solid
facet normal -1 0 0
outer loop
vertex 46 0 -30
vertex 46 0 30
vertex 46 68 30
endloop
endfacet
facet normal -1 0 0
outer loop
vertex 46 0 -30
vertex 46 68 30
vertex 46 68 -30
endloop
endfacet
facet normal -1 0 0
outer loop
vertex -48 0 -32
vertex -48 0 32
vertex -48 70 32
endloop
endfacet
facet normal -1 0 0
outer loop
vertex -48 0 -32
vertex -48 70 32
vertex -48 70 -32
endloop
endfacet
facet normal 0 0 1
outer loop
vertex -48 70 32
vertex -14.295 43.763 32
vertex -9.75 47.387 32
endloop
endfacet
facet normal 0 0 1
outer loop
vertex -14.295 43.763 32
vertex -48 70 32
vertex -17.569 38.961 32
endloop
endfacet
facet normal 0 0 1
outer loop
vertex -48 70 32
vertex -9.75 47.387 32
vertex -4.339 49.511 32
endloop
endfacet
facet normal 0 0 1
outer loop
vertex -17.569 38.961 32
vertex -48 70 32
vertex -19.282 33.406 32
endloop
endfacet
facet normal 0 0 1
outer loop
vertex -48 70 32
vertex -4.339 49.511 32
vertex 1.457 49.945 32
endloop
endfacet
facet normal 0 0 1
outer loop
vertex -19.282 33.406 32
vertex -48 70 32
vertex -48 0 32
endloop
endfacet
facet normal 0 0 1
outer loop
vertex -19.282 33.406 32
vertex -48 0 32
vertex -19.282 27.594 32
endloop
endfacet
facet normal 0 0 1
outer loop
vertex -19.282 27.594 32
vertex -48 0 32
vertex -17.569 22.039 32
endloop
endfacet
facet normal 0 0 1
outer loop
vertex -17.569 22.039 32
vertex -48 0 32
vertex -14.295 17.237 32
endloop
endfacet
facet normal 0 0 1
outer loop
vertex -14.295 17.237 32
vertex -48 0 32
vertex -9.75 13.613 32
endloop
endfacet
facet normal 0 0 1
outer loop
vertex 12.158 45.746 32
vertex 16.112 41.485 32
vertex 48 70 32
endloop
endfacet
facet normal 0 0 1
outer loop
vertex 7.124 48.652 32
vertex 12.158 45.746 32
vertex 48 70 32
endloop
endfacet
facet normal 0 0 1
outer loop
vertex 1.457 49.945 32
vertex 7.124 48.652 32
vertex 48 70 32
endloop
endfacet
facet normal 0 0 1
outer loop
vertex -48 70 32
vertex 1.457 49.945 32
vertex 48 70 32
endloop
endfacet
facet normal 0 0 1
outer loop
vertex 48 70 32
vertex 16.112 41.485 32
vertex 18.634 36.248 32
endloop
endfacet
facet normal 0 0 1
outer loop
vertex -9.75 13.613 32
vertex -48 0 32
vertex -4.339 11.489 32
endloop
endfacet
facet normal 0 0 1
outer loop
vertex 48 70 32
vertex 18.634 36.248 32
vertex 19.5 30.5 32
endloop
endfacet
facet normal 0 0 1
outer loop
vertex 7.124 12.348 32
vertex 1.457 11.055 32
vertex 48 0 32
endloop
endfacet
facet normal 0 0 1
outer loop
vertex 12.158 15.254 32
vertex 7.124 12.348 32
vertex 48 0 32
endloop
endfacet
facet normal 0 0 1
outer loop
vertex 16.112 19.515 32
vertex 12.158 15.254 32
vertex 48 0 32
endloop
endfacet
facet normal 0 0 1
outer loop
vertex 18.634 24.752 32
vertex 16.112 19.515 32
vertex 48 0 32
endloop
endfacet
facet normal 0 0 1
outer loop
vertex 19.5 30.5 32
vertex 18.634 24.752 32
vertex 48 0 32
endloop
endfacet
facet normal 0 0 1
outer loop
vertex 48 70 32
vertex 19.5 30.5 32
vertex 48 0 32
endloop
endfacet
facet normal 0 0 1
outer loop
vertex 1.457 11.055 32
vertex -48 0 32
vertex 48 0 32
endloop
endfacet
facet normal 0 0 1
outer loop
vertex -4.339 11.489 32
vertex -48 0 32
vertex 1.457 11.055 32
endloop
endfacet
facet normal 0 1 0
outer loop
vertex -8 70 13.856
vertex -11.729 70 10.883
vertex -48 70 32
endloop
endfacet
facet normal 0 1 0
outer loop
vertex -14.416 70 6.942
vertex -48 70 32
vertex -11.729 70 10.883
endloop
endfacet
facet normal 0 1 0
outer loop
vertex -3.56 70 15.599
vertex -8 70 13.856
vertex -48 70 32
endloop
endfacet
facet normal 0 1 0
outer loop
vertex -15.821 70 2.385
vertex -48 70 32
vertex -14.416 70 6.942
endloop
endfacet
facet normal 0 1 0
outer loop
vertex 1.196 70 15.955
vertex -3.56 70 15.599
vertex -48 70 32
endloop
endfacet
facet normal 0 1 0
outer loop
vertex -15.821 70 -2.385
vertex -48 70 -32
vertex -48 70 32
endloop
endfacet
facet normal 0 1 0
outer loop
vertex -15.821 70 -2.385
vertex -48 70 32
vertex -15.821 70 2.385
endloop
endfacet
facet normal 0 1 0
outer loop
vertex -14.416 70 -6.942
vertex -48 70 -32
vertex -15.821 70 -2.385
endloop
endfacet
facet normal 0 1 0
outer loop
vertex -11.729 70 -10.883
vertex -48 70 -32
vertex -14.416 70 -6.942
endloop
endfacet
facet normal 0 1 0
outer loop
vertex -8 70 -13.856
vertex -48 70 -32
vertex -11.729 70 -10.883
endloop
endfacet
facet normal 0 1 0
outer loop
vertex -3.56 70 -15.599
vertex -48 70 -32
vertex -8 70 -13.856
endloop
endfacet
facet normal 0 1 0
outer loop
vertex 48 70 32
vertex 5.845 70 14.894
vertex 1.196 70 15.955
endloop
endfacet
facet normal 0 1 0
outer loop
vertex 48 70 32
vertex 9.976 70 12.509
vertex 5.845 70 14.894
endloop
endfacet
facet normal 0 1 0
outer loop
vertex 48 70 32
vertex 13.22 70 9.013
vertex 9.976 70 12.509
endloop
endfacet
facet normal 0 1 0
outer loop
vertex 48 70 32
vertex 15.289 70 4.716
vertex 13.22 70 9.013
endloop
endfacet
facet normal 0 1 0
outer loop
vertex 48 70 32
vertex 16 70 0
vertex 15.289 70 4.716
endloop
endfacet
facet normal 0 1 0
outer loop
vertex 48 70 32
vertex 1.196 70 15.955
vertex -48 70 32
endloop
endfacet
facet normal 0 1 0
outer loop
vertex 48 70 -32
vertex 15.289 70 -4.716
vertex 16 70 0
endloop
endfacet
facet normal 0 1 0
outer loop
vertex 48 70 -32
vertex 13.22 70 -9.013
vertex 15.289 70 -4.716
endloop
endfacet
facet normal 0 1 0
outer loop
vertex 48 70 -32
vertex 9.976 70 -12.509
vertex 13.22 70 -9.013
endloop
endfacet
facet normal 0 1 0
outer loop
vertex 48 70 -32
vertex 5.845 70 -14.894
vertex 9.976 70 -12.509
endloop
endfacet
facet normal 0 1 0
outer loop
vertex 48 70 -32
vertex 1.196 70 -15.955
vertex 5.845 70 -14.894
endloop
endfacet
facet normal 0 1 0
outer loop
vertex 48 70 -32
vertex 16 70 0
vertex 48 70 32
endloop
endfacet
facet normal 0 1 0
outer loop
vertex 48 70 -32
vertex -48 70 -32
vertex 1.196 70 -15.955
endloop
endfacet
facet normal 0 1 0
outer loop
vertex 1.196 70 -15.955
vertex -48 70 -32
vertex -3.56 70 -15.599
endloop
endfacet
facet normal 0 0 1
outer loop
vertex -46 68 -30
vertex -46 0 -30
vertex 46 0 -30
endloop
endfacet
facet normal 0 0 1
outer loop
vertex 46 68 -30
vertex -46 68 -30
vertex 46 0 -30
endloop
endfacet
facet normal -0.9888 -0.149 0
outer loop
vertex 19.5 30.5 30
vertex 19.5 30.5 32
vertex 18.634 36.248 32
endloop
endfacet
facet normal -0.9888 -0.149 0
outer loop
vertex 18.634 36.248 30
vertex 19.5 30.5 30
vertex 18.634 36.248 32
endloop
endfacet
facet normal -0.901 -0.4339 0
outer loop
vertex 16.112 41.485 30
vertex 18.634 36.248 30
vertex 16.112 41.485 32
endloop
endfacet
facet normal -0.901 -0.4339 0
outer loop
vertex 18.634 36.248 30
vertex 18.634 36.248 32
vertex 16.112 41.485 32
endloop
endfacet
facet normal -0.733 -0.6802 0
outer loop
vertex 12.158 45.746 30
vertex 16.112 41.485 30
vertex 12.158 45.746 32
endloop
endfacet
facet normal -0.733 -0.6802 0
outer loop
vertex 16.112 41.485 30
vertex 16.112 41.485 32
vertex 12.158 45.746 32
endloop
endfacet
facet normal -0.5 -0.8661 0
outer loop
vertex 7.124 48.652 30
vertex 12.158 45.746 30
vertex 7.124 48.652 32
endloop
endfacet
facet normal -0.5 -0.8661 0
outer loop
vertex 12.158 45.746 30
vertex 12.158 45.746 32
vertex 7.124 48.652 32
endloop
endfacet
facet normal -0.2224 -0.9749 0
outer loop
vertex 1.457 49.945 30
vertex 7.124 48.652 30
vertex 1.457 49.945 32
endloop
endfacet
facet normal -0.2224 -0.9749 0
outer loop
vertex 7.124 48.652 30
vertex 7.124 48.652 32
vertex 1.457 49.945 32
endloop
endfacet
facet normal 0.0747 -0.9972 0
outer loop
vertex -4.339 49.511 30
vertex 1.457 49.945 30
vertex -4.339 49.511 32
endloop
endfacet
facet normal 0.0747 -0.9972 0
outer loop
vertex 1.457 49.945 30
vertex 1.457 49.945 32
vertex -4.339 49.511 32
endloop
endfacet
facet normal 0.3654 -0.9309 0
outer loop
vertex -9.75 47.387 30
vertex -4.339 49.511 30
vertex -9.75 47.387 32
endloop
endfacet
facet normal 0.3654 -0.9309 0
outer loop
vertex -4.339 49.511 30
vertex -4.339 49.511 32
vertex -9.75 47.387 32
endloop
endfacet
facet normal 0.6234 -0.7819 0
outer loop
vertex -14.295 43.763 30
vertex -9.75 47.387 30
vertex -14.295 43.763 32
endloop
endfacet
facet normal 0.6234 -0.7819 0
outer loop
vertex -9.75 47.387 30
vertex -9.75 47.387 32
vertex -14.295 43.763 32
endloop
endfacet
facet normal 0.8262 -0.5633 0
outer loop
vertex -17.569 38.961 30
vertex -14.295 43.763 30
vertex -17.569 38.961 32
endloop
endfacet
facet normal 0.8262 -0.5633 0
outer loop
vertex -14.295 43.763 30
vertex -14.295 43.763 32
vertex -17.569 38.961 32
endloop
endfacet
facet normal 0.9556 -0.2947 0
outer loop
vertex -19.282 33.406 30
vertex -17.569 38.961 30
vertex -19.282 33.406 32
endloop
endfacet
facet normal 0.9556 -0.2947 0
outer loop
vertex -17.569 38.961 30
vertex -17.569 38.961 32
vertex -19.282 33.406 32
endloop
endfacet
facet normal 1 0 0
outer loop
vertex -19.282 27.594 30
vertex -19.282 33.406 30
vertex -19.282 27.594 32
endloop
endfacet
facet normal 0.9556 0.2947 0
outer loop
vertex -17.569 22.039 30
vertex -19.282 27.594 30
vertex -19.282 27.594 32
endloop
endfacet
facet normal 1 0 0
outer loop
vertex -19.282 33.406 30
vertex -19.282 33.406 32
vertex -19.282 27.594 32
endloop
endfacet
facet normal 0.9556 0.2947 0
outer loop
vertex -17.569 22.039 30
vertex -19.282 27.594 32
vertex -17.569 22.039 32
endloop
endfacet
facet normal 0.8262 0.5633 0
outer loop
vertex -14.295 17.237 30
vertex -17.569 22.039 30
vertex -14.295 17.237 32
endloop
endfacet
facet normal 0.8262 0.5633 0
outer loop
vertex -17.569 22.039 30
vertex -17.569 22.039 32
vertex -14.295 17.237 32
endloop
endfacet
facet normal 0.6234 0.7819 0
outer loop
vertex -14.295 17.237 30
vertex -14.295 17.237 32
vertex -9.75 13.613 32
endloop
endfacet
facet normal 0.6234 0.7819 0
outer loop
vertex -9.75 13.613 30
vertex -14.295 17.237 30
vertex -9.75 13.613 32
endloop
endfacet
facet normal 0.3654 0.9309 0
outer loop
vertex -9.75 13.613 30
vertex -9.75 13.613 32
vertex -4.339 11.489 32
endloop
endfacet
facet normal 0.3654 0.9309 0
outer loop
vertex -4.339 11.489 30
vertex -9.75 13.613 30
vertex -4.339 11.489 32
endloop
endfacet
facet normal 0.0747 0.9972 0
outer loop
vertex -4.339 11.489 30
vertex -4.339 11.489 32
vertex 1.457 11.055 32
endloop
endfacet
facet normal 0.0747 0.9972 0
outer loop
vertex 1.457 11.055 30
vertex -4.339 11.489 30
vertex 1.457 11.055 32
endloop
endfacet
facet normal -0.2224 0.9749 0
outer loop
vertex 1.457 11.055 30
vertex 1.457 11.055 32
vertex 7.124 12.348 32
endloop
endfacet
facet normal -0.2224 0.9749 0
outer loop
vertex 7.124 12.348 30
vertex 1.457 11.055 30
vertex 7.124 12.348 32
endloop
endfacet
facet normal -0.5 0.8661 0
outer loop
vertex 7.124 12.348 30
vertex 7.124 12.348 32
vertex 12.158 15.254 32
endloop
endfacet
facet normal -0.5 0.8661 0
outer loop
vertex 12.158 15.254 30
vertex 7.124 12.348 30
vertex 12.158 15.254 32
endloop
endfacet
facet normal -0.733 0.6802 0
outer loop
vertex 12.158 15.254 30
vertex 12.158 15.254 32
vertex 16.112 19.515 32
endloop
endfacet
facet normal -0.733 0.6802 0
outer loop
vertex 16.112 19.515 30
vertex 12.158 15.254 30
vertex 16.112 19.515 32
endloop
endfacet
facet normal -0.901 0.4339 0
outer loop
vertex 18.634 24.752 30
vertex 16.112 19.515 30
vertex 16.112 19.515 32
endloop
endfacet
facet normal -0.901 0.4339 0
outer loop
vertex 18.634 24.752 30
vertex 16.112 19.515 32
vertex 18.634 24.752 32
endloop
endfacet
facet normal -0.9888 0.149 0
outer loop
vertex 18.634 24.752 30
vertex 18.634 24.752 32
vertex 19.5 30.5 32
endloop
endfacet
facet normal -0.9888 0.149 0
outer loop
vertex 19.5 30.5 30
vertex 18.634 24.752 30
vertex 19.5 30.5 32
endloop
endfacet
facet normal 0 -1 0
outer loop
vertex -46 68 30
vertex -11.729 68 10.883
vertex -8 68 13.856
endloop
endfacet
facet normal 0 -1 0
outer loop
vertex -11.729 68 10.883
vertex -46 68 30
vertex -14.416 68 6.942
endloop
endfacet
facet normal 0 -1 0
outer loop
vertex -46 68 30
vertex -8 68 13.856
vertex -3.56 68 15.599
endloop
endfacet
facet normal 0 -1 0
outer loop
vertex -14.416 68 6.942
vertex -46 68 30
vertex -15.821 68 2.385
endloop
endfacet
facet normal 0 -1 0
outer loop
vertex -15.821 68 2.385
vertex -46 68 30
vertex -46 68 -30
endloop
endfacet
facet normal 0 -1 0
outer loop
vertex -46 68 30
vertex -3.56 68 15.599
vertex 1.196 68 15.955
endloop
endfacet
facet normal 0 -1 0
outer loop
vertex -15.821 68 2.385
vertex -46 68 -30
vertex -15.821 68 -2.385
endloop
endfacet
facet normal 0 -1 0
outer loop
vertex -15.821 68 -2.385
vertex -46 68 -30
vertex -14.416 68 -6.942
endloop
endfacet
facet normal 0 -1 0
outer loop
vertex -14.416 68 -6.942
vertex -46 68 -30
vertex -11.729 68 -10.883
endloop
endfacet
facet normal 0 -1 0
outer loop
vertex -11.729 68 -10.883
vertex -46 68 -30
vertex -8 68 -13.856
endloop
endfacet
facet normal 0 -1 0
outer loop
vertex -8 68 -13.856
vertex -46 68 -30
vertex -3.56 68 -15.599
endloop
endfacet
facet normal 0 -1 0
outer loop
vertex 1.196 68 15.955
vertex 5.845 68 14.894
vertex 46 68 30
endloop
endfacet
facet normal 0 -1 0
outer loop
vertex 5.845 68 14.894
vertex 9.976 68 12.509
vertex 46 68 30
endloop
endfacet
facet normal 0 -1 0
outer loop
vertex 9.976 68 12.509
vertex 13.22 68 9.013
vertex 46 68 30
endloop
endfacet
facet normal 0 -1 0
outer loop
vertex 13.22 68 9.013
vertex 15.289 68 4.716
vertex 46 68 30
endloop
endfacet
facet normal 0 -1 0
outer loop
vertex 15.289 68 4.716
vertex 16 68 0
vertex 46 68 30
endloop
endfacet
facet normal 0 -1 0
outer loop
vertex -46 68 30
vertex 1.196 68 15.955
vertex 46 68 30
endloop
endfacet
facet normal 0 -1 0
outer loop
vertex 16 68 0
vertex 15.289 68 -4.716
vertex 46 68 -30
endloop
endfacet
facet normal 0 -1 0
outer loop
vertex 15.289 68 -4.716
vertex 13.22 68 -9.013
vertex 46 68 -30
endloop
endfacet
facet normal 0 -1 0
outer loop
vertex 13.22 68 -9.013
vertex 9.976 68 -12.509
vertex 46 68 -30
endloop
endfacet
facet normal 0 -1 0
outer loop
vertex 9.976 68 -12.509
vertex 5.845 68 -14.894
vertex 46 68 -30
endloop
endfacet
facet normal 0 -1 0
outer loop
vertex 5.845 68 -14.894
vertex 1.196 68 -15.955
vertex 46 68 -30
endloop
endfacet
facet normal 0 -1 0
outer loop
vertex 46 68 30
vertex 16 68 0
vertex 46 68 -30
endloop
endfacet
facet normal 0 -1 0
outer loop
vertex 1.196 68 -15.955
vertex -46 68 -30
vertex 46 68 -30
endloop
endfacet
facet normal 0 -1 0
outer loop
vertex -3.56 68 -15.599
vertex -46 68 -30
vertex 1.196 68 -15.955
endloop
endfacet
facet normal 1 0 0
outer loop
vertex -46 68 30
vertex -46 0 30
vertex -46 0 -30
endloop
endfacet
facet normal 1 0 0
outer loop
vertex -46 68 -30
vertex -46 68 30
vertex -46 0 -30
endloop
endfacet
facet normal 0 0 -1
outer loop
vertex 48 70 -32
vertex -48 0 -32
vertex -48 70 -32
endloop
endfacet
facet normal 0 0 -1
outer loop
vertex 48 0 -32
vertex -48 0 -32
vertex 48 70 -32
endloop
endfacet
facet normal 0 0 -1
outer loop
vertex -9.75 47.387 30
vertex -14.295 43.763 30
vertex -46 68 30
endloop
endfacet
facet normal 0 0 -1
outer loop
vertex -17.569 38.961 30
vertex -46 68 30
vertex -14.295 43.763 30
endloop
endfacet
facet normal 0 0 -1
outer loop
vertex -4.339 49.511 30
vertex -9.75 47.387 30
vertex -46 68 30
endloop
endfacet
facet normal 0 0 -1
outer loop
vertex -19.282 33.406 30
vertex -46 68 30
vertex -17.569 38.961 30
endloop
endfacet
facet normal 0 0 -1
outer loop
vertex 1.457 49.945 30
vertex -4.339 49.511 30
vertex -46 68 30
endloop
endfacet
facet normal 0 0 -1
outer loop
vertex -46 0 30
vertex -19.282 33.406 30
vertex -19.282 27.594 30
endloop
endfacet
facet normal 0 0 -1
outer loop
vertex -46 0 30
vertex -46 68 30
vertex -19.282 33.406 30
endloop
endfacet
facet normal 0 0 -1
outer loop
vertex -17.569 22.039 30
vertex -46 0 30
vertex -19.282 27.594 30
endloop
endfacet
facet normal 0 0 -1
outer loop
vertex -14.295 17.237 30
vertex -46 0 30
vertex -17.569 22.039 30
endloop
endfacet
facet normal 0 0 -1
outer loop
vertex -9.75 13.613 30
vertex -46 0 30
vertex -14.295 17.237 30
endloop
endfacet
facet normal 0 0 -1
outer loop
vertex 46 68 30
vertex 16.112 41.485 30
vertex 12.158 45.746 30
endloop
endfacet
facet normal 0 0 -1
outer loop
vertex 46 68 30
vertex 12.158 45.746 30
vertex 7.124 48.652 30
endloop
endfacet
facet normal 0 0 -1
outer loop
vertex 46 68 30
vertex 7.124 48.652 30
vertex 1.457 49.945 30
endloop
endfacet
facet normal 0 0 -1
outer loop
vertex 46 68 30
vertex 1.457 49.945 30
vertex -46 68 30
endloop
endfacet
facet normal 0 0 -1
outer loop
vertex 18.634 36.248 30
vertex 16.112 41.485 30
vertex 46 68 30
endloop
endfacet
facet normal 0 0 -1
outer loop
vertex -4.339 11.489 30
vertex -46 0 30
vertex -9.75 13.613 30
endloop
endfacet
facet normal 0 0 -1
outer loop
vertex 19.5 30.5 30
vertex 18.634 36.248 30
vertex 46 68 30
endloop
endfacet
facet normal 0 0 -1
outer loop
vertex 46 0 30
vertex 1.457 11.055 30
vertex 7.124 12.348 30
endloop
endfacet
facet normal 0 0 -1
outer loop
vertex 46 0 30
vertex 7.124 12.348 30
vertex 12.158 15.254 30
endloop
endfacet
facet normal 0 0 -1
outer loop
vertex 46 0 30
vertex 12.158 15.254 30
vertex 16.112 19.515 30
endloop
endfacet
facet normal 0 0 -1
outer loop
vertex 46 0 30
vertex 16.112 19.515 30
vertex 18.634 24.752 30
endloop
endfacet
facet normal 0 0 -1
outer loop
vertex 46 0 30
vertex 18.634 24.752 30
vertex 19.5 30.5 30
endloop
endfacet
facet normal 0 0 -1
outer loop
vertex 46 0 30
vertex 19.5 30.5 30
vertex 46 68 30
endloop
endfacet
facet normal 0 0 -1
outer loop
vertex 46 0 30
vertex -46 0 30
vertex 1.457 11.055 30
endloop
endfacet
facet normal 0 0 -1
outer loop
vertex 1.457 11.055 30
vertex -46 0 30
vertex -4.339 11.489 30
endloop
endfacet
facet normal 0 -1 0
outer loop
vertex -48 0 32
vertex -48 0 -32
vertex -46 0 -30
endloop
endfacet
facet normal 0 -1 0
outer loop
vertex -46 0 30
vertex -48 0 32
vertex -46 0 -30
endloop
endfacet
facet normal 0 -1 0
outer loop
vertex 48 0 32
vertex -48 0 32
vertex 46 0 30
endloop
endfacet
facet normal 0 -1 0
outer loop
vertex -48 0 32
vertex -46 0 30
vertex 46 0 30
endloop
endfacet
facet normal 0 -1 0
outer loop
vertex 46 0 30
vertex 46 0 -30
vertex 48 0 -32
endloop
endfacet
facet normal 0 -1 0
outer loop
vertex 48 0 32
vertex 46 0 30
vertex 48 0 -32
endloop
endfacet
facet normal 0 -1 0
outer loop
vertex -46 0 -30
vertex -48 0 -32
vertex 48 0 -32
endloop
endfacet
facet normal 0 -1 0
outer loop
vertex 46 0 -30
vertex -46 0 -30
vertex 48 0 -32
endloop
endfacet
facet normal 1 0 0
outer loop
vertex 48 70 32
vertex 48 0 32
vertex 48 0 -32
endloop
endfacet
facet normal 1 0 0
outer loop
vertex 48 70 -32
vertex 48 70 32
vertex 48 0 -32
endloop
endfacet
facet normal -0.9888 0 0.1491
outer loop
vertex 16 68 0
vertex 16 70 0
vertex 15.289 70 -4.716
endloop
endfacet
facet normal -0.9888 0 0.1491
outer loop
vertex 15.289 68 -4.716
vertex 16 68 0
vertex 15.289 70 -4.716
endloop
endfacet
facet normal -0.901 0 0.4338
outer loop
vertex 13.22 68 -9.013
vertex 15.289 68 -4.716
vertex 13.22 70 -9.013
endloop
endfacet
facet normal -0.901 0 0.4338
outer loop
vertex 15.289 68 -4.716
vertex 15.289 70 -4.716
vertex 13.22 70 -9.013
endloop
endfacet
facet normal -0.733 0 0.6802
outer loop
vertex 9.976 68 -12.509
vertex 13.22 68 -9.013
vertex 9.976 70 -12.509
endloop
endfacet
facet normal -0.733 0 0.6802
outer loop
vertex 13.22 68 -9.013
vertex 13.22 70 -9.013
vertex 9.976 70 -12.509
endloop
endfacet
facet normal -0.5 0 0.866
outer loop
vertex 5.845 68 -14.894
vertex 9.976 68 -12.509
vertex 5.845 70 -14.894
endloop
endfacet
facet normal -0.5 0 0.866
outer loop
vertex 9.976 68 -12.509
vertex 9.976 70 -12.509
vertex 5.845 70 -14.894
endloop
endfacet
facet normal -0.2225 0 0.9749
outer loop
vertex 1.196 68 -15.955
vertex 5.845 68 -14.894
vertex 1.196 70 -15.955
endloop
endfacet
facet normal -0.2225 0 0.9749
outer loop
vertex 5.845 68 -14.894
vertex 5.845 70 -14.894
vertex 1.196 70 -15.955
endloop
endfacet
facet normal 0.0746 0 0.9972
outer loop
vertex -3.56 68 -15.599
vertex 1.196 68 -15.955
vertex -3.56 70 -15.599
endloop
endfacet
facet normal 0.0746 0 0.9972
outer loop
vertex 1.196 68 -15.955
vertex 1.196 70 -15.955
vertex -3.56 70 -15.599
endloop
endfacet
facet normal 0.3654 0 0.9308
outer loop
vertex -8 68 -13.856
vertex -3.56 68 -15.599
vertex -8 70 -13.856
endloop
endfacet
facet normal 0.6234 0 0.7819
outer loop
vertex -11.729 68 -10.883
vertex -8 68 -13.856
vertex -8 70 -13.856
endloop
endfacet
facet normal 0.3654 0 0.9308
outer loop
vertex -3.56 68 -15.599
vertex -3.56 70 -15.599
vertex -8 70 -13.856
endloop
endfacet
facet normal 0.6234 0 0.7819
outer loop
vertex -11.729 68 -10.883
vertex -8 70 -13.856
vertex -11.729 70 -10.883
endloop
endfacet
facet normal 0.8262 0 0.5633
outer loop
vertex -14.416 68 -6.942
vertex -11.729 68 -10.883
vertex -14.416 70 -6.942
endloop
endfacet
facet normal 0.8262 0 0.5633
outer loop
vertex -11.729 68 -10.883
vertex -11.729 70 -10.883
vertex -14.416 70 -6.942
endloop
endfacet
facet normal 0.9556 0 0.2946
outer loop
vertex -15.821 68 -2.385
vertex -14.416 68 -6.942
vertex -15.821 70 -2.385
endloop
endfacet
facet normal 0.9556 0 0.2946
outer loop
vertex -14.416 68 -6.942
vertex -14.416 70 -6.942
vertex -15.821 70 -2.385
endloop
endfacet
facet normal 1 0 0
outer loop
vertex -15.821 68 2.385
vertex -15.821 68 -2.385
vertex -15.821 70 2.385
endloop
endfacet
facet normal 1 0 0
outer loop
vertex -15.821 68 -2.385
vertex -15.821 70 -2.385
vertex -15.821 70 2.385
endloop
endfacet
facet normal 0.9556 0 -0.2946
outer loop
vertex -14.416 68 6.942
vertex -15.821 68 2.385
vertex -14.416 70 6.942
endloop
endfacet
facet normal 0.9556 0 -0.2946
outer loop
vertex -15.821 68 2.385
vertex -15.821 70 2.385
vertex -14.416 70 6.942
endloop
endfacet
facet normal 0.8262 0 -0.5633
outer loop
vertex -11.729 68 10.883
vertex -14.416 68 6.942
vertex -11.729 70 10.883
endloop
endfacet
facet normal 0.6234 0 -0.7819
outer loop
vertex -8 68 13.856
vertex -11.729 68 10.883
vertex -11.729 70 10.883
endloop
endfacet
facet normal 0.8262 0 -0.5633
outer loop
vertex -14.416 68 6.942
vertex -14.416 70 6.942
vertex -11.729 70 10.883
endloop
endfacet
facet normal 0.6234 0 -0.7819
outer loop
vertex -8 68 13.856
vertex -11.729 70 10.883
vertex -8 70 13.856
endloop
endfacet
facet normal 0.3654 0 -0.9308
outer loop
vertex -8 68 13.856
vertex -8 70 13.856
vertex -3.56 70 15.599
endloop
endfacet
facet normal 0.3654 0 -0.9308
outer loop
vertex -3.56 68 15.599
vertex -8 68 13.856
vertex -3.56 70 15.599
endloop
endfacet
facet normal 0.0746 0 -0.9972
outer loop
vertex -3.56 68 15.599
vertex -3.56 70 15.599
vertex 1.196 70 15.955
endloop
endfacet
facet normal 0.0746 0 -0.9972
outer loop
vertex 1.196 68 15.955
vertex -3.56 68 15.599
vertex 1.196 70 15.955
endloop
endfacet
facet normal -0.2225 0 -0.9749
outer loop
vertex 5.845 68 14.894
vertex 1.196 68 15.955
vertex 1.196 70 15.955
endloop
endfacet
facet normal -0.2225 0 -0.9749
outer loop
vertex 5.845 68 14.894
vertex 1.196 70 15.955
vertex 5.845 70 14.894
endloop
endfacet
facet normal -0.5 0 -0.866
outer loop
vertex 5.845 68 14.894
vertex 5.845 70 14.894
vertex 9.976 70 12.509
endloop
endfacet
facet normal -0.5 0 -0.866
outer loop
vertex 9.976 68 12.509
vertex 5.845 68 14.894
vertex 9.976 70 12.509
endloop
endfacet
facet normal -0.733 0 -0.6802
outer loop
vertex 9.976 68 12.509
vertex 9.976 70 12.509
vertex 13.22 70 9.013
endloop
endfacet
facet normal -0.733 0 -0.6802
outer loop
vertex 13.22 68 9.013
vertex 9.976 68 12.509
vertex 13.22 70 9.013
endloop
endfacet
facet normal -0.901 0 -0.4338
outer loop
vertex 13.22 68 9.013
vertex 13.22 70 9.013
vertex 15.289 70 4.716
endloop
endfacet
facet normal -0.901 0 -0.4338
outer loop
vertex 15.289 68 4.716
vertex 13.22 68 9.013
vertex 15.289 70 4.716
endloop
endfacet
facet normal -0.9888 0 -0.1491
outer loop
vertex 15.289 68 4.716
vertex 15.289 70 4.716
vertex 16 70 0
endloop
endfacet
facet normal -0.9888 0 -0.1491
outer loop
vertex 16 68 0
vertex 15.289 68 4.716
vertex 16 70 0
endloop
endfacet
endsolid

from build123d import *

# Parameters (mm, degrees)
CROQUIS1_W              = 96
CROQUIS1_H              = 64
SALIENTE_EXTRUIR1_DEPTH = 70
VACIADO1_T              = -2
CROQUIS2_R              = 16
CORTAR_EXTRUIR1_DEPTH   = 5
CROQUIS3_R              = 19.5
CORTAR_EXTRUIR2_DEPTH   = 5


with BuildPart() as part:
    # Croquis1 → Saliente-Extruir1 (new body)
    with BuildSketch(Plane(origin=(0, 0, 0), x_dir=(1, 0, 0), z_dir=(0, 1, 0))):
        Rectangle(CROQUIS1_W, CROQUIS1_H)
    extrude(amount=SALIENTE_EXTRUIR1_DEPTH)

    # Vaciado1
    vaciado1_openings = [part.faces().sort_by_distance(p)[0] for p in [
        (0, 0, 0),
    ]]
    offset(amount=VACIADO1_T, openings=vaciado1_openings, kind=Kind.INTERSECTION)

    # Croquis2 → Cortar-Extruir1 (cut)
    with BuildSketch(Plane(origin=(0, 70, 0), x_dir=(1, 0, 0), z_dir=(0, 1, 0))):
        Circle(CROQUIS2_R)
    extrude(amount=-CORTAR_EXTRUIR1_DEPTH, mode=Mode.SUBTRACT)

    # Croquis3 → Cortar-Extruir2 (cut)
    with BuildSketch(Plane.XY.offset(32)):
        with Locations((0, 30.5)):
            Circle(CROQUIS3_R)
    extrude(amount=-CORTAR_EXTRUIR2_DEPTH, mode=Mode.SUBTRACT)


solid = part.part
